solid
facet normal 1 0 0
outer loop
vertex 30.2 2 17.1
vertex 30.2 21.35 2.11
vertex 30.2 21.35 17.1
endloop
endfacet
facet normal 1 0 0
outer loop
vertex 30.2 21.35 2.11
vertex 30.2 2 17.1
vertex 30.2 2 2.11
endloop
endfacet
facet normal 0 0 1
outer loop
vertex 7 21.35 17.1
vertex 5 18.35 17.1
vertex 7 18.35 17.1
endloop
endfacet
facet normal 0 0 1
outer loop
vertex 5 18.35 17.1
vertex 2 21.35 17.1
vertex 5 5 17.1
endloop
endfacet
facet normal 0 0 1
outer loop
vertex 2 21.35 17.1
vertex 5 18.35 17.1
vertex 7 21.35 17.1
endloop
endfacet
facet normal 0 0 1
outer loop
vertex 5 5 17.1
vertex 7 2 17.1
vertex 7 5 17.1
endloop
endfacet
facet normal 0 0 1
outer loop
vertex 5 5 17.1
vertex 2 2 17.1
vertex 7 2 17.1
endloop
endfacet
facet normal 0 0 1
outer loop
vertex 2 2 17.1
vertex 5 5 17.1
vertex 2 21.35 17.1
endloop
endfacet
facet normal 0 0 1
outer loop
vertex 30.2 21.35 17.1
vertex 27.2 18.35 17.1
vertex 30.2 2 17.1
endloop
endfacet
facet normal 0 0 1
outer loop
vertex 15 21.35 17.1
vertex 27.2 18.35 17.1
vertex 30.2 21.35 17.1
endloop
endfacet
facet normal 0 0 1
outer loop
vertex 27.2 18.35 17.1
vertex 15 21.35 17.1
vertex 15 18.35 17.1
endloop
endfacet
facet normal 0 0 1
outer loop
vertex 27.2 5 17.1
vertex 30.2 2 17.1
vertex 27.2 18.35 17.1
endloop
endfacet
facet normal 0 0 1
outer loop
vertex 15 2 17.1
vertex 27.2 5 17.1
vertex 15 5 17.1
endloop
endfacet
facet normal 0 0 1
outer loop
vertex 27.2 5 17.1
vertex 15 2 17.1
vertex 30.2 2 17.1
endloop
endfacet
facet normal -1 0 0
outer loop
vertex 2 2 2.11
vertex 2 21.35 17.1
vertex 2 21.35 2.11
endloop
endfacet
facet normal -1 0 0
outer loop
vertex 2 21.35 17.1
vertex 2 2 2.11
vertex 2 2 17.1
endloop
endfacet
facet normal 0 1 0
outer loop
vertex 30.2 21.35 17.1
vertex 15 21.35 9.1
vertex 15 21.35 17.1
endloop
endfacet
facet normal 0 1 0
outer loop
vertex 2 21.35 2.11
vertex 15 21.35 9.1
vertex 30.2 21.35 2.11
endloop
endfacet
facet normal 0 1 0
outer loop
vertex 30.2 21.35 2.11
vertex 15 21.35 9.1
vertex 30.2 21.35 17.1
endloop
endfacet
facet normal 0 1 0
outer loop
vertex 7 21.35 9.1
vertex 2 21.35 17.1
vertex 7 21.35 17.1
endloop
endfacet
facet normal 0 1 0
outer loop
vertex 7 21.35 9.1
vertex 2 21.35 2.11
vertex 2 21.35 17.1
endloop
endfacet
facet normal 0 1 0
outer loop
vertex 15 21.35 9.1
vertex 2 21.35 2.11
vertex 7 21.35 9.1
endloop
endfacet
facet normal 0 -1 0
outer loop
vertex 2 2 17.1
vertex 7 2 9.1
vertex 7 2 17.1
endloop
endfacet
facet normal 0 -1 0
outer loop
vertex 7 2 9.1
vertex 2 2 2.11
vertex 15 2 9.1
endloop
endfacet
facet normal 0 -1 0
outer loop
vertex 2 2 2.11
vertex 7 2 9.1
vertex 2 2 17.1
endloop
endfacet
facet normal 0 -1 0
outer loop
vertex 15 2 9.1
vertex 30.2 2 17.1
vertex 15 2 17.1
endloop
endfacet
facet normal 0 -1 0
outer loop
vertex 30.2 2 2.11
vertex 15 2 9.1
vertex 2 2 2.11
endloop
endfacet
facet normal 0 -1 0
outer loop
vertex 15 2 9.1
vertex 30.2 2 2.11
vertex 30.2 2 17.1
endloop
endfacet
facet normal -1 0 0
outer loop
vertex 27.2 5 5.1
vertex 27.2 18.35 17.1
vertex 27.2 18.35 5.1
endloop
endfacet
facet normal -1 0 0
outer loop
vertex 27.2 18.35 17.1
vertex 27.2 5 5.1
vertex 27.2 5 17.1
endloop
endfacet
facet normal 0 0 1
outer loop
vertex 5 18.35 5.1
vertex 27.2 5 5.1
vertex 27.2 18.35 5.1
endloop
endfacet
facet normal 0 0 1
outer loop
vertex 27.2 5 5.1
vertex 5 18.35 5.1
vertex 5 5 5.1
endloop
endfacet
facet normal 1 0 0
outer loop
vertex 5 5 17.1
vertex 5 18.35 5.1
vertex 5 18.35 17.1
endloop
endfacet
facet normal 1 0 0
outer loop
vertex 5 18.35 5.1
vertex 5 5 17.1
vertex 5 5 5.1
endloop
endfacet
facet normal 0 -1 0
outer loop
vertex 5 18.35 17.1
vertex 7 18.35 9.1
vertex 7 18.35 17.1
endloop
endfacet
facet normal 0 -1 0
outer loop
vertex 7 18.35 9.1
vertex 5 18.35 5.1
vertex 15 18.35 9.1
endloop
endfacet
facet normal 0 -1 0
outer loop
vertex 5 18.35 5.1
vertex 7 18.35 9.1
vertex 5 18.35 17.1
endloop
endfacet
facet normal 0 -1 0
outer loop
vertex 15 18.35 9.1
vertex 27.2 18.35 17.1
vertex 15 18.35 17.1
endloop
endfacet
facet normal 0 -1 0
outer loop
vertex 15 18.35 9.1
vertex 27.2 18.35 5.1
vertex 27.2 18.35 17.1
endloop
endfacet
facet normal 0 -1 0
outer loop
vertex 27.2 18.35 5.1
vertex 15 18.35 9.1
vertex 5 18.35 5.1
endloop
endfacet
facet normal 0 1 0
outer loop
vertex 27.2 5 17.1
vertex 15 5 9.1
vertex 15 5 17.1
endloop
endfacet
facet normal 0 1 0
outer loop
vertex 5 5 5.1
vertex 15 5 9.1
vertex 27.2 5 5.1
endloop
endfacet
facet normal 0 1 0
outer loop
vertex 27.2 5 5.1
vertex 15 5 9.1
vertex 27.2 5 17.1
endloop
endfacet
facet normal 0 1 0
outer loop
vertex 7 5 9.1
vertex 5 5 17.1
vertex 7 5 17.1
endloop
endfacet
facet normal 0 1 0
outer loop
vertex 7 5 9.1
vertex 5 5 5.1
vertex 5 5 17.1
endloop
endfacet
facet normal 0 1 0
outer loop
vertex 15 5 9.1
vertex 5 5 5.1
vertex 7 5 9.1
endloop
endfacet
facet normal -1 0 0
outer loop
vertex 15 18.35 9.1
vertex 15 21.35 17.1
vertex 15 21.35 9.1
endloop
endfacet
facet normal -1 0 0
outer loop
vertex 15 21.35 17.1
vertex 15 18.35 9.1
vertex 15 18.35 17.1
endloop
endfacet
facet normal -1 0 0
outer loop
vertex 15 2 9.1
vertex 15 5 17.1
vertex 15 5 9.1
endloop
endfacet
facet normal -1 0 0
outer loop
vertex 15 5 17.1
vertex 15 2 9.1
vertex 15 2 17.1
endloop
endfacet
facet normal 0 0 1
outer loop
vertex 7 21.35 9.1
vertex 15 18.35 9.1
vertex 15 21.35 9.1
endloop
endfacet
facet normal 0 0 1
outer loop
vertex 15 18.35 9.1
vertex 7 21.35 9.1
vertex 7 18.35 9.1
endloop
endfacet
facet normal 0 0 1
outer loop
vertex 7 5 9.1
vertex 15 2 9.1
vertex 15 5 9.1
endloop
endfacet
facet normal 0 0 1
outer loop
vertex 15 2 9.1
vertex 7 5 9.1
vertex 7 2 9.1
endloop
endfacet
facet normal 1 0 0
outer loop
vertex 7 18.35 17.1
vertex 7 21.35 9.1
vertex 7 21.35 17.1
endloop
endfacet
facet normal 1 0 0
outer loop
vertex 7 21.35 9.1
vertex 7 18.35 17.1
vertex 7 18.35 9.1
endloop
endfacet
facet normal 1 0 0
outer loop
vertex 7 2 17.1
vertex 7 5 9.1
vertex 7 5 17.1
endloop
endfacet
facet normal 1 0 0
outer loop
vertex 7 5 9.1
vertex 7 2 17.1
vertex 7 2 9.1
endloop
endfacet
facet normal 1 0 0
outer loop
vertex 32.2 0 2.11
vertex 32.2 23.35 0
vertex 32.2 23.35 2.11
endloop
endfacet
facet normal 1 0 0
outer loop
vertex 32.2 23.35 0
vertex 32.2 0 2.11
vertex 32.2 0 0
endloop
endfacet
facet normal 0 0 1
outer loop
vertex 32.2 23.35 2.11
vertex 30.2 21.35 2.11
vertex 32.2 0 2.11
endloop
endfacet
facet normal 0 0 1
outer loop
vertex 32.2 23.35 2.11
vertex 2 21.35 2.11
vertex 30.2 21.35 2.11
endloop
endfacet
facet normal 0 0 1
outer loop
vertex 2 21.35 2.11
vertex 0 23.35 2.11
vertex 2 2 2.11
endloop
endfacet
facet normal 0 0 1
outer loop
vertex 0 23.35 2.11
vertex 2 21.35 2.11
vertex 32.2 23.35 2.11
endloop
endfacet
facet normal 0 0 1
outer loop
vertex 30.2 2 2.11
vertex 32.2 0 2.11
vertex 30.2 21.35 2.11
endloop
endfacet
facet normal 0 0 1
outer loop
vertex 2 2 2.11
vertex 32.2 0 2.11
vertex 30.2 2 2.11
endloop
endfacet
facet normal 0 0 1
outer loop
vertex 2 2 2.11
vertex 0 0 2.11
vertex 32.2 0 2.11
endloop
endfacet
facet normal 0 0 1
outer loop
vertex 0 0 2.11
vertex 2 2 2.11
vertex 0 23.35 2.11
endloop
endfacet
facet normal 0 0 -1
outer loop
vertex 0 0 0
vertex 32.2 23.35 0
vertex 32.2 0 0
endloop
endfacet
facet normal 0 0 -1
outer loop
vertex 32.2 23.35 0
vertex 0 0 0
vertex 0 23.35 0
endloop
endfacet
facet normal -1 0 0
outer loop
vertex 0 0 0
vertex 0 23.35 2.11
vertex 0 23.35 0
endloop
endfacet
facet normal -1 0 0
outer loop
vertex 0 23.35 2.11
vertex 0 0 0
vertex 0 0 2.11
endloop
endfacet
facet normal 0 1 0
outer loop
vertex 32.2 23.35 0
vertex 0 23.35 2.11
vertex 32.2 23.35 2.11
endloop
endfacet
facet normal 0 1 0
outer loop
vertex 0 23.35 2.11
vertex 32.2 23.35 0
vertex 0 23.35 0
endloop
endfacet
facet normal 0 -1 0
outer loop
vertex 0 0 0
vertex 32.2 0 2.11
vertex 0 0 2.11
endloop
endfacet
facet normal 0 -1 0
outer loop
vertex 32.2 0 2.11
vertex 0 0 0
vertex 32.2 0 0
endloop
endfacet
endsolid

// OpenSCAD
// $fa = 8;
$fs = 0.25;

length = 28.2;
width = 19.35;
height = 15;
wall_thick = 3;
base_overlap = 2;
base_height = 2.1;
rivet_hole_dia = 8;
rivet_hole_len_offset = 5;
rivet_hole_wid_offset = 8.55-base_height;

union() {
    // the part inserted into the table leg
    translate([base_overlap, base_overlap, base_height]) difference() {
        cube([length, width, height]);
        // the internal cavity
        translate([wall_thick, wall_thick, wall_thick])
          cube([length-wall_thick*2, width-wall_thick*2, height-wall_thick+0.01]);
        // the rivet hole in the side
        translate([rivet_hole_len_offset, -0.01, height-rivet_hole_dia])
          // rotate([-90, 0, 0])
          // cylinder(d=rivet_hole_dia, h=width+0.02);
          cube([rivet_hole_dia, width+0.02, rivet_hole_dia+0.01]);
    }
    // the base
    cube([length+base_overlap*2, width+base_overlap*2, base_height+0.01]);
}
